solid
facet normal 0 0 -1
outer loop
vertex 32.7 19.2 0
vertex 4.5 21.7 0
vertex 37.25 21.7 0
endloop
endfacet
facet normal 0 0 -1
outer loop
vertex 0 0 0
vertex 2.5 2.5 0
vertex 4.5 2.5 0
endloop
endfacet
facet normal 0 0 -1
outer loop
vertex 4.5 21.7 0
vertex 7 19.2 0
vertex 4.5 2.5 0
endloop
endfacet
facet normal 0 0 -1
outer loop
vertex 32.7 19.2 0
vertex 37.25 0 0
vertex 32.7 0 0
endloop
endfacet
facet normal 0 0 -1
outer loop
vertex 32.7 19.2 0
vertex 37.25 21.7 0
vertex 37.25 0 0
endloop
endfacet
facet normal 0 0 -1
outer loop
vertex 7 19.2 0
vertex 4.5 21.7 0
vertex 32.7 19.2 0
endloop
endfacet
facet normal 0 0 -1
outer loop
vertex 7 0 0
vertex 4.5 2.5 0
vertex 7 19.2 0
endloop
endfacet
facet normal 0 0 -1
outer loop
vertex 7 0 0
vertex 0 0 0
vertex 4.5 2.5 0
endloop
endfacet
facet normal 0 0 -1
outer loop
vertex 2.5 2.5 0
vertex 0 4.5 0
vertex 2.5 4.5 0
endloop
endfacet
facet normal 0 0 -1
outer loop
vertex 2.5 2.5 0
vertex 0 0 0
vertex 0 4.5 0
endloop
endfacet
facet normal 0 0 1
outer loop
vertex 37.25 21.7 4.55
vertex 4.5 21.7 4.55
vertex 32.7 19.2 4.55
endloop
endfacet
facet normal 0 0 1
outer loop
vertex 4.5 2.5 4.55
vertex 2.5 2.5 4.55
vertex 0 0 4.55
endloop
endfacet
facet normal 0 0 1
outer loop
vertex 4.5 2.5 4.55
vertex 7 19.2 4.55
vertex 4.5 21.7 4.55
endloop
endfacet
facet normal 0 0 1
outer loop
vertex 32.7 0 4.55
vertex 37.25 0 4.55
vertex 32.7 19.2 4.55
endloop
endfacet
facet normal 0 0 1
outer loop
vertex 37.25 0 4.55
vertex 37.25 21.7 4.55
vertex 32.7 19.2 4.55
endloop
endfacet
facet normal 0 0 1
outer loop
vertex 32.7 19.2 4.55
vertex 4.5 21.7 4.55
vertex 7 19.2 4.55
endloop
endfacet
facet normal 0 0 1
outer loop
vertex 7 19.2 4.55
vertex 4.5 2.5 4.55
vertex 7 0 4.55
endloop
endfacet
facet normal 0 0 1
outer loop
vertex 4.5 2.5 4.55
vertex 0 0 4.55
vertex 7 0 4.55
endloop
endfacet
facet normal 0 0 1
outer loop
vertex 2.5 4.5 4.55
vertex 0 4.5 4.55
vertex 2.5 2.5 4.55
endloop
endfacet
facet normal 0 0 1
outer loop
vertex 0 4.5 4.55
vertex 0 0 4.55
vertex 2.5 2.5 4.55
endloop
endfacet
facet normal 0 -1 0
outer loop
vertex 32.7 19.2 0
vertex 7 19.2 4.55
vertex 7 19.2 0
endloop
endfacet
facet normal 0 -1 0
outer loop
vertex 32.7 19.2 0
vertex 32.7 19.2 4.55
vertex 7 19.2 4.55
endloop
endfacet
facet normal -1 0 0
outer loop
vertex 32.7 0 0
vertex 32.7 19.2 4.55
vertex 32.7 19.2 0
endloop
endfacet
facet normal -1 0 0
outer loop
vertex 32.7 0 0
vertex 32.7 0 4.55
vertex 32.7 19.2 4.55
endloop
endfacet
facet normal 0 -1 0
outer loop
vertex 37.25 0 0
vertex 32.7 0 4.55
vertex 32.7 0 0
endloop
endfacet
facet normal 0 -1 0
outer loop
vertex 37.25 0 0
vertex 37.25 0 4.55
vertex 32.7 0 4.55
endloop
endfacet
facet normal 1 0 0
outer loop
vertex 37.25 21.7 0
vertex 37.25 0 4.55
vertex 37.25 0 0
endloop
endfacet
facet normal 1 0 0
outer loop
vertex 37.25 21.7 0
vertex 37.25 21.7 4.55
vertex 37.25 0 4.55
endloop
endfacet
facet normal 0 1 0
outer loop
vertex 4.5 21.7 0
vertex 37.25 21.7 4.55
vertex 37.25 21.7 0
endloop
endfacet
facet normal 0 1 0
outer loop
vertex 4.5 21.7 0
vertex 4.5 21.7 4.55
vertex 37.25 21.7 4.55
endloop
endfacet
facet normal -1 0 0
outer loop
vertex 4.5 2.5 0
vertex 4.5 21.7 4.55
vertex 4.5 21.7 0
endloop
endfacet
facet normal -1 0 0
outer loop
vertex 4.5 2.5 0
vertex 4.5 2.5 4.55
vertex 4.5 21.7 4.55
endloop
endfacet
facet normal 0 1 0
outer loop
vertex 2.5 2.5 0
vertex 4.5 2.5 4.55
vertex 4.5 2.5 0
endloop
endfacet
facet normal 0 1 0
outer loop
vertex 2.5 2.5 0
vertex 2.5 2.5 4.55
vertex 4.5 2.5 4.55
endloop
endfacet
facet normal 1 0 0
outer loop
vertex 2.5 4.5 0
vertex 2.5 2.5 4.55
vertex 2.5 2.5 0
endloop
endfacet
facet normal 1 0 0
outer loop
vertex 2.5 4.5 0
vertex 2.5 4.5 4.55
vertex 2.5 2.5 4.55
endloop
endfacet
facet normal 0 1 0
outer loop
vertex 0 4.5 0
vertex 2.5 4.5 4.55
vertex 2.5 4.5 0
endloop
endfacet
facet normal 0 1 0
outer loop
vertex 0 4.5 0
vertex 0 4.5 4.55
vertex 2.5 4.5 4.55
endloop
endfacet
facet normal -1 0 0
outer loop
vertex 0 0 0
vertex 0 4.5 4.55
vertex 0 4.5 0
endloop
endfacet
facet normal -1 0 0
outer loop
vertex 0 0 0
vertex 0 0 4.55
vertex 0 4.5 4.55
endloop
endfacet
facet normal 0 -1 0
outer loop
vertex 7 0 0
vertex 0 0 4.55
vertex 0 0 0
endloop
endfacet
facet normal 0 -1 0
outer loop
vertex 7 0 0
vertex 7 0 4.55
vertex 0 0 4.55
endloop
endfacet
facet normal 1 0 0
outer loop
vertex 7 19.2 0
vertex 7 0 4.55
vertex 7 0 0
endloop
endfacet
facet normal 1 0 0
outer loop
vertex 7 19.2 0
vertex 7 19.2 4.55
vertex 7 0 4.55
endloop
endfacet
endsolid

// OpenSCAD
// created by IndiePandaaaaa|Lukas

THICKNESS = 2.5;
TOLERANCE = .15;
$fn = 75;

HOOK_WIDTH_INSIDE = 2;
PLATSA_SIDE_WALL_OFFSET = 25.7; // 25.7 for side hook, 42.5 for door closing
PLATSA_MOUNTING_WIDTH = 4.7 - TOLERANCE;
PLATSA_MOUNTING_DEPTH = 19.2;

linear_extrude(PLATSA_MOUNTING_WIDTH) {
  polygon([
      [0, 0],
      [THICKNESS * 2 + HOOK_WIDTH_INSIDE, 0],
      [THICKNESS * 2 + HOOK_WIDTH_INSIDE, PLATSA_MOUNTING_DEPTH],
      [THICKNESS * 2 + HOOK_WIDTH_INSIDE + PLATSA_SIDE_WALL_OFFSET, PLATSA_MOUNTING_DEPTH],
      [THICKNESS * 2 + HOOK_WIDTH_INSIDE + PLATSA_SIDE_WALL_OFFSET, 0],
      [THICKNESS * 2 + HOOK_WIDTH_INSIDE + PLATSA_SIDE_WALL_OFFSET + PLATSA_MOUNTING_WIDTH, 0],
      [THICKNESS * 2 + HOOK_WIDTH_INSIDE + PLATSA_SIDE_WALL_OFFSET + PLATSA_MOUNTING_WIDTH, PLATSA_MOUNTING_DEPTH +
      THICKNESS],
      [THICKNESS + HOOK_WIDTH_INSIDE, PLATSA_MOUNTING_DEPTH + THICKNESS],
      [THICKNESS + HOOK_WIDTH_INSIDE, THICKNESS],
      [THICKNESS, THICKNESS],
      [THICKNESS, THICKNESS + HOOK_WIDTH_INSIDE],
      [0, THICKNESS + HOOK_WIDTH_INSIDE],
    ]);
}
